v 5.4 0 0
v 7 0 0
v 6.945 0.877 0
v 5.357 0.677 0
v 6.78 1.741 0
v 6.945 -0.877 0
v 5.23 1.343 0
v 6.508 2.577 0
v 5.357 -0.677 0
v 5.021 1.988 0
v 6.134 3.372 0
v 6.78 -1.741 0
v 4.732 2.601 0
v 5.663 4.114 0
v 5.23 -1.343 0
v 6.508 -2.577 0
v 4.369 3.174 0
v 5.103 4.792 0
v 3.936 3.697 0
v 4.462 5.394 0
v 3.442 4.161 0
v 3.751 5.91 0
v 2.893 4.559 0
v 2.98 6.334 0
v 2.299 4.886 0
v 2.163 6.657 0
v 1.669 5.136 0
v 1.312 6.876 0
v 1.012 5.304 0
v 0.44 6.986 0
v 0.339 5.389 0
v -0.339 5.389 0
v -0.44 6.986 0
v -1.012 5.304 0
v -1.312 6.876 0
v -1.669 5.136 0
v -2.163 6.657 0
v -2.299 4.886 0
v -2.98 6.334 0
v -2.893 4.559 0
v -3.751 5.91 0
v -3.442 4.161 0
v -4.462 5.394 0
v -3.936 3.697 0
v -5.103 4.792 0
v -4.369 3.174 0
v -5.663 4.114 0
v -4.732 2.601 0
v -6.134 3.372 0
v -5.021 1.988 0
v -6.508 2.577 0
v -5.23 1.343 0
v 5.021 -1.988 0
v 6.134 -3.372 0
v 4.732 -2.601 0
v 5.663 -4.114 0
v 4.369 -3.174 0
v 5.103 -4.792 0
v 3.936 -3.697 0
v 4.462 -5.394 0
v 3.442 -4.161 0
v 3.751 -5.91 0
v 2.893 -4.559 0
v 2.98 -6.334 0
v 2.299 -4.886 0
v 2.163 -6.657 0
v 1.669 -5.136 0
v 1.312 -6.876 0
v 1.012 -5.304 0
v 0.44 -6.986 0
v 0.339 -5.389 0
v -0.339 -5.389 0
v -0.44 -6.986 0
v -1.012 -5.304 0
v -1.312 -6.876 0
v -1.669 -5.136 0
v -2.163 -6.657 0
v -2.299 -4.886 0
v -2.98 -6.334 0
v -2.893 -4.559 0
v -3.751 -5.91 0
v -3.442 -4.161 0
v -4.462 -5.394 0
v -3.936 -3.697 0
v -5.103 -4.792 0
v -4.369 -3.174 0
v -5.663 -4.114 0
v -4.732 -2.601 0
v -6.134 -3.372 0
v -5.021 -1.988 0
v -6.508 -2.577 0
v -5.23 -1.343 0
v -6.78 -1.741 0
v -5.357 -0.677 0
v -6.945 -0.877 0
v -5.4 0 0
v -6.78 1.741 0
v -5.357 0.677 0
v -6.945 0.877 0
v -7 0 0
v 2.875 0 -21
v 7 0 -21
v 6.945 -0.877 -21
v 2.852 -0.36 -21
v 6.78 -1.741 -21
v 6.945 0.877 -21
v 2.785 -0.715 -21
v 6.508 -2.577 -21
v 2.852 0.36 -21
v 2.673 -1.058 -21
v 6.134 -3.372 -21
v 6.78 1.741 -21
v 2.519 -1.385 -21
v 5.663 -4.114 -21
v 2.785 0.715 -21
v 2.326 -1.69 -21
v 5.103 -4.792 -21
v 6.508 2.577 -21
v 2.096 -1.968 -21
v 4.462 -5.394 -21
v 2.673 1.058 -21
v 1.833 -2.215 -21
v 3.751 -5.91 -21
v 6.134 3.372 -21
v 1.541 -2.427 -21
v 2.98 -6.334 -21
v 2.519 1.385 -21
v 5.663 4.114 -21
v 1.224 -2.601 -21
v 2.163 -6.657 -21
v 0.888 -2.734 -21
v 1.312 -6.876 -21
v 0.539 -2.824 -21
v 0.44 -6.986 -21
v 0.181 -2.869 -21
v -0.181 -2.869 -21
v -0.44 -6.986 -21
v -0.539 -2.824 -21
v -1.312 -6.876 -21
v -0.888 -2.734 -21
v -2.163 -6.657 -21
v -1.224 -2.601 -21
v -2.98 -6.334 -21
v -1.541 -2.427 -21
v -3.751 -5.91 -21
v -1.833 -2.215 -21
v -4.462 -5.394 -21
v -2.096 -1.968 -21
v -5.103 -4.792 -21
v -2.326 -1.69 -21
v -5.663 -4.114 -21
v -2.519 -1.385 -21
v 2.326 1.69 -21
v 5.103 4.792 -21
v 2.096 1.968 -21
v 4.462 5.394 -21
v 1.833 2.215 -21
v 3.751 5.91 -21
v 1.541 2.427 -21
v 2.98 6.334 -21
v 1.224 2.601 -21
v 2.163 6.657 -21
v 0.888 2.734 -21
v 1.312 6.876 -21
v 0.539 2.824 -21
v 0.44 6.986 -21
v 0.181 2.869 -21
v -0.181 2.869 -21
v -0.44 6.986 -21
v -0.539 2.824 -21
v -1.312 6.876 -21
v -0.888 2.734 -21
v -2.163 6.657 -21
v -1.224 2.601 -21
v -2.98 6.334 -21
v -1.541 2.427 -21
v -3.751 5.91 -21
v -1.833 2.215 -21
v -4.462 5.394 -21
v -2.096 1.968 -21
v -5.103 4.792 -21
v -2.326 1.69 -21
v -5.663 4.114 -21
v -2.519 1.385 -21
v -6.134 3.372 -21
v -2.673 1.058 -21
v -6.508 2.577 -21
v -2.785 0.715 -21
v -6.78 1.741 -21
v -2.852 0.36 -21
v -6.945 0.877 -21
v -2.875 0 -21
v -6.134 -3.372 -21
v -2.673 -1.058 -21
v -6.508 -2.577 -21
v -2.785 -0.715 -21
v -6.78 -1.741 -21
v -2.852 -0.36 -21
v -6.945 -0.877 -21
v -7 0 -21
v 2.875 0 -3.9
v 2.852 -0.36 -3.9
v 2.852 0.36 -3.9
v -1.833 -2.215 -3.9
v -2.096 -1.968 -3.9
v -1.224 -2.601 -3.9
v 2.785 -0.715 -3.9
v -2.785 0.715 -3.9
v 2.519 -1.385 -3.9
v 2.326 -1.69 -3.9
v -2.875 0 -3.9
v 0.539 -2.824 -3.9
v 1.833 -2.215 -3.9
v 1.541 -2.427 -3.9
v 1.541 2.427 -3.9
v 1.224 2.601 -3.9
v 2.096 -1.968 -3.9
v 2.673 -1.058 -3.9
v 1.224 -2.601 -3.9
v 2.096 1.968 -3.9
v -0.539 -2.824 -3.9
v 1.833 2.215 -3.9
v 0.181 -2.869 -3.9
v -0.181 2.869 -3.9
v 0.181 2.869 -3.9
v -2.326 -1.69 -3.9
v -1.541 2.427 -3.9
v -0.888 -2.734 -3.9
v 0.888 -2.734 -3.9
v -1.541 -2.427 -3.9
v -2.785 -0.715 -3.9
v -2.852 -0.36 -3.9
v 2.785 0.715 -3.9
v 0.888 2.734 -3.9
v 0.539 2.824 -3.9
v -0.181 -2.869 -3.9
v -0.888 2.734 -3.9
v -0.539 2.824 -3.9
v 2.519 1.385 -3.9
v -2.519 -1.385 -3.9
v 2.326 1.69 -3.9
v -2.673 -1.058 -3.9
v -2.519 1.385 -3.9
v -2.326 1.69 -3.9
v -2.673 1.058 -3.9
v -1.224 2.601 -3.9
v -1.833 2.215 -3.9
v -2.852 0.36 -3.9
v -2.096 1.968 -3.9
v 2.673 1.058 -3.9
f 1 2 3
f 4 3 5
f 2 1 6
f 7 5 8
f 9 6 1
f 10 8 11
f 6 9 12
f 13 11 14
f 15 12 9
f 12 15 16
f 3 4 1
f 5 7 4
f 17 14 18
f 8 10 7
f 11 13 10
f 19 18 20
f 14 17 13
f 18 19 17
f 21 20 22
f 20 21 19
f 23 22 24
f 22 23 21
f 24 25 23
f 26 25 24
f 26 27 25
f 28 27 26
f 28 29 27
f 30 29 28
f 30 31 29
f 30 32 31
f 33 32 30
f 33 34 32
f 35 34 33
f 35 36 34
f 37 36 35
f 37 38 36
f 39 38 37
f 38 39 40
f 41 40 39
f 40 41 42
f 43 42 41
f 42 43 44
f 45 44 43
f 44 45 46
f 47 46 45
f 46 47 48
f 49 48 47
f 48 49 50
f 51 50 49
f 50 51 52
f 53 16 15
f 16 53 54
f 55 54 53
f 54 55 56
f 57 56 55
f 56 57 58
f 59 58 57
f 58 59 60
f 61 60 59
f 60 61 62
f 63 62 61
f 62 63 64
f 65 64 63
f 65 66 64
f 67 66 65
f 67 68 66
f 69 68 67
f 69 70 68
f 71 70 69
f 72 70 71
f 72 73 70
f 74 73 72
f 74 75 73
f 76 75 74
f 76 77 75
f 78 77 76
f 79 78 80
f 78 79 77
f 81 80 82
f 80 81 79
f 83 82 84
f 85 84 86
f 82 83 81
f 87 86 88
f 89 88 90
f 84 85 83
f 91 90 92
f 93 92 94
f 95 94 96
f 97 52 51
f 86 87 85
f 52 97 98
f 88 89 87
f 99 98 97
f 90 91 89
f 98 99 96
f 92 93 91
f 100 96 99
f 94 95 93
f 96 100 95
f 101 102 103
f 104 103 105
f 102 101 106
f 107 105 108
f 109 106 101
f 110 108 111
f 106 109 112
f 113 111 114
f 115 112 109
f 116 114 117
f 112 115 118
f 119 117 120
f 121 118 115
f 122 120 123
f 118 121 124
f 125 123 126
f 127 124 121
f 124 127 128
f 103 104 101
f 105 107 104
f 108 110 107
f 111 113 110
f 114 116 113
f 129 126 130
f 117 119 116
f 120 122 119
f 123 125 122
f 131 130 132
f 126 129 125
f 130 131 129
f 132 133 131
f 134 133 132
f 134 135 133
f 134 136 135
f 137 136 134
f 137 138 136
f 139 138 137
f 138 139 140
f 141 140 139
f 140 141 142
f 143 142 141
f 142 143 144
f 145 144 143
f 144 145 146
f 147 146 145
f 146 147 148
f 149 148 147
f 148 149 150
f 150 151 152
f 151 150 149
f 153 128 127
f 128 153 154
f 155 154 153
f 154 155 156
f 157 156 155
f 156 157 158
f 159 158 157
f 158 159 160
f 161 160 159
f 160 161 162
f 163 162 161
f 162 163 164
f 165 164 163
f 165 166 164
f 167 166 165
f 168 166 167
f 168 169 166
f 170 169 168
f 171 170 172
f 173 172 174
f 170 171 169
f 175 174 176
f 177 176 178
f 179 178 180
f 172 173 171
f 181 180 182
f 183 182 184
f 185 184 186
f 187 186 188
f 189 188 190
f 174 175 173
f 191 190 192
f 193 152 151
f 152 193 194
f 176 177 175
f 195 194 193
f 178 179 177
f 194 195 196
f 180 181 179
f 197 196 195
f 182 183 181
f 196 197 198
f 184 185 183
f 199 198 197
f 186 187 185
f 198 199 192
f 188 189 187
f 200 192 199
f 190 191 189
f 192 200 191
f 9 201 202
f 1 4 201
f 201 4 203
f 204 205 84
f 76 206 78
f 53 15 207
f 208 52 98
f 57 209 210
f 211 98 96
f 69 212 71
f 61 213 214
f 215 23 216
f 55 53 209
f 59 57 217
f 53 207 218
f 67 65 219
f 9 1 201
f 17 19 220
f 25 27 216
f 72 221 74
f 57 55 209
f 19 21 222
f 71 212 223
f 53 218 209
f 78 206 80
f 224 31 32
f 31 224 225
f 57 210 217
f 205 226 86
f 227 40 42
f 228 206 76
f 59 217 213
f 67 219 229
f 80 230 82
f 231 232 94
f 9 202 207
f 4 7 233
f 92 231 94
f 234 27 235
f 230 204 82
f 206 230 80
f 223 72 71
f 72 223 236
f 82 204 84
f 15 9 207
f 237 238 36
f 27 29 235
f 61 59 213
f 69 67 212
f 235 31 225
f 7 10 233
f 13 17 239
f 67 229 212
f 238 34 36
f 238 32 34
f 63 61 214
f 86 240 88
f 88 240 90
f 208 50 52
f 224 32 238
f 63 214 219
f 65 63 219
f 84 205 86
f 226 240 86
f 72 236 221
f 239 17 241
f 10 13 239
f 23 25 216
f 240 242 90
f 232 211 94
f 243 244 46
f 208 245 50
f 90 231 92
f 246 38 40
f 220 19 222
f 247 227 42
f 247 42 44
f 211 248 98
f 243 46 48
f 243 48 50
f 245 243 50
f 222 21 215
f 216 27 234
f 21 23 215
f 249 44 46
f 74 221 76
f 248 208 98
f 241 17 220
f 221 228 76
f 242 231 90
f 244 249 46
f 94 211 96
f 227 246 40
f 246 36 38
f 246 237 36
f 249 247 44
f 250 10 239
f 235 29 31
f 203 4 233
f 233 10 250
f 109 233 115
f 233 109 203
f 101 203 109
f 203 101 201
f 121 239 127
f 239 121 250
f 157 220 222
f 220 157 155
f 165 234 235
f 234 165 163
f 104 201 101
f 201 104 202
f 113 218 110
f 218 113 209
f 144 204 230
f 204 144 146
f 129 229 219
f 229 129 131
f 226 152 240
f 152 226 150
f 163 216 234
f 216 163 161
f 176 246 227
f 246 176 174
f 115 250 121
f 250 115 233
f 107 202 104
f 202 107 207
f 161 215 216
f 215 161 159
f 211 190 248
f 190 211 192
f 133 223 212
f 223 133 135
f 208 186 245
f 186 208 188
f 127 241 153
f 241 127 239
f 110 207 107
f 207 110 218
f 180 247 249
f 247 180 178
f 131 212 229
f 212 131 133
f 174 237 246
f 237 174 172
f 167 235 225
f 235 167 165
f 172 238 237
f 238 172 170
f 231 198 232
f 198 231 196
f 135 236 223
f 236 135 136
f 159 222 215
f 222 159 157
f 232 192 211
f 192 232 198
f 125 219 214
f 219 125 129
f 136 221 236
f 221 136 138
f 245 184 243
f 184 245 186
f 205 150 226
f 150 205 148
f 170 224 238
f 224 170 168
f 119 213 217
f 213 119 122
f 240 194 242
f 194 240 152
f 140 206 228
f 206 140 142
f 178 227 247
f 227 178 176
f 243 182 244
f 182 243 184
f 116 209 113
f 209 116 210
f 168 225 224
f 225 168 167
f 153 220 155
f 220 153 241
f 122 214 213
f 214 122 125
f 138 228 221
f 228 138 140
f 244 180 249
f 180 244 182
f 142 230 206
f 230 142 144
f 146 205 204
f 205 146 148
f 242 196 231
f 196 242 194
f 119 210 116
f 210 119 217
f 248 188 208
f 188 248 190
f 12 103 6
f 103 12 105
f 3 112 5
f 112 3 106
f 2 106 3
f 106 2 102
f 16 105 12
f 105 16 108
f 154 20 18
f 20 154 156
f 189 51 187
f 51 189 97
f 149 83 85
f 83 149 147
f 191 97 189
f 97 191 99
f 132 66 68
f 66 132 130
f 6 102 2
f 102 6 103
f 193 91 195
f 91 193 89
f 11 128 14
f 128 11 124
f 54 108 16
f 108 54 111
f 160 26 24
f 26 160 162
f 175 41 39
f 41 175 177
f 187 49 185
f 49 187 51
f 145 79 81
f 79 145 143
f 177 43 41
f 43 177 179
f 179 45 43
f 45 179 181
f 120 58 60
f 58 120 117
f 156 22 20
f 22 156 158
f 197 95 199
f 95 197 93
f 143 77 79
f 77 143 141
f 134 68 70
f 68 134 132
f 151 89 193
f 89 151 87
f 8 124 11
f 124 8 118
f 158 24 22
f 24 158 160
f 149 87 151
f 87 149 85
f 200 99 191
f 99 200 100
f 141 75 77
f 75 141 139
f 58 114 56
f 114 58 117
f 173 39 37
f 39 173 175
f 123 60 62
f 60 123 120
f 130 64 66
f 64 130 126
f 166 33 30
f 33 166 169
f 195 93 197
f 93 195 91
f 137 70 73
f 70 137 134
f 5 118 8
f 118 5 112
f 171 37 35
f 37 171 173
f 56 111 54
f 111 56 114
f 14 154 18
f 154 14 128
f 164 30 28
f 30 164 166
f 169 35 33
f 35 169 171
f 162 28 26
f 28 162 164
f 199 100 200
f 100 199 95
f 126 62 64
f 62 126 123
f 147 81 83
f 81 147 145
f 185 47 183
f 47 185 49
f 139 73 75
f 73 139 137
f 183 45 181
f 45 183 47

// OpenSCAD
$fn = 50;


difference() {
	union() {
		translate(v = [0, 0, -21.0000000000]) {
			cylinder(h = 21, r = 7.0000000000);
		}
		cylinder(h = 0, r = 13.0000000000);
	}
	union() {
		translate(v = [0, 0, 0]) {
			rotate(a = [0, 0, 0]) {
				difference() {
					union() {
						#translate(v = [0, 0, -21.0000000000]) {
							cylinder(h = 21, r = 2.6000000000);
						}
						#translate(v = [0, 0, -3.9000000000]) {
							cylinder(h = 3.9000000000, r1 = 2.8750000000, r2 = 5.4000000000);
						}
						#translate(v = [0, 0, -21.0000000000]) {
							cylinder(h = 21, r = 2.8750000000);
						}
						#translate(v = [0, 0, -21.0000000000]) {
							cylinder(h = 21, r = 2.6000000000);
						}
					}
					union();
				}
			}
		}
	}
}
